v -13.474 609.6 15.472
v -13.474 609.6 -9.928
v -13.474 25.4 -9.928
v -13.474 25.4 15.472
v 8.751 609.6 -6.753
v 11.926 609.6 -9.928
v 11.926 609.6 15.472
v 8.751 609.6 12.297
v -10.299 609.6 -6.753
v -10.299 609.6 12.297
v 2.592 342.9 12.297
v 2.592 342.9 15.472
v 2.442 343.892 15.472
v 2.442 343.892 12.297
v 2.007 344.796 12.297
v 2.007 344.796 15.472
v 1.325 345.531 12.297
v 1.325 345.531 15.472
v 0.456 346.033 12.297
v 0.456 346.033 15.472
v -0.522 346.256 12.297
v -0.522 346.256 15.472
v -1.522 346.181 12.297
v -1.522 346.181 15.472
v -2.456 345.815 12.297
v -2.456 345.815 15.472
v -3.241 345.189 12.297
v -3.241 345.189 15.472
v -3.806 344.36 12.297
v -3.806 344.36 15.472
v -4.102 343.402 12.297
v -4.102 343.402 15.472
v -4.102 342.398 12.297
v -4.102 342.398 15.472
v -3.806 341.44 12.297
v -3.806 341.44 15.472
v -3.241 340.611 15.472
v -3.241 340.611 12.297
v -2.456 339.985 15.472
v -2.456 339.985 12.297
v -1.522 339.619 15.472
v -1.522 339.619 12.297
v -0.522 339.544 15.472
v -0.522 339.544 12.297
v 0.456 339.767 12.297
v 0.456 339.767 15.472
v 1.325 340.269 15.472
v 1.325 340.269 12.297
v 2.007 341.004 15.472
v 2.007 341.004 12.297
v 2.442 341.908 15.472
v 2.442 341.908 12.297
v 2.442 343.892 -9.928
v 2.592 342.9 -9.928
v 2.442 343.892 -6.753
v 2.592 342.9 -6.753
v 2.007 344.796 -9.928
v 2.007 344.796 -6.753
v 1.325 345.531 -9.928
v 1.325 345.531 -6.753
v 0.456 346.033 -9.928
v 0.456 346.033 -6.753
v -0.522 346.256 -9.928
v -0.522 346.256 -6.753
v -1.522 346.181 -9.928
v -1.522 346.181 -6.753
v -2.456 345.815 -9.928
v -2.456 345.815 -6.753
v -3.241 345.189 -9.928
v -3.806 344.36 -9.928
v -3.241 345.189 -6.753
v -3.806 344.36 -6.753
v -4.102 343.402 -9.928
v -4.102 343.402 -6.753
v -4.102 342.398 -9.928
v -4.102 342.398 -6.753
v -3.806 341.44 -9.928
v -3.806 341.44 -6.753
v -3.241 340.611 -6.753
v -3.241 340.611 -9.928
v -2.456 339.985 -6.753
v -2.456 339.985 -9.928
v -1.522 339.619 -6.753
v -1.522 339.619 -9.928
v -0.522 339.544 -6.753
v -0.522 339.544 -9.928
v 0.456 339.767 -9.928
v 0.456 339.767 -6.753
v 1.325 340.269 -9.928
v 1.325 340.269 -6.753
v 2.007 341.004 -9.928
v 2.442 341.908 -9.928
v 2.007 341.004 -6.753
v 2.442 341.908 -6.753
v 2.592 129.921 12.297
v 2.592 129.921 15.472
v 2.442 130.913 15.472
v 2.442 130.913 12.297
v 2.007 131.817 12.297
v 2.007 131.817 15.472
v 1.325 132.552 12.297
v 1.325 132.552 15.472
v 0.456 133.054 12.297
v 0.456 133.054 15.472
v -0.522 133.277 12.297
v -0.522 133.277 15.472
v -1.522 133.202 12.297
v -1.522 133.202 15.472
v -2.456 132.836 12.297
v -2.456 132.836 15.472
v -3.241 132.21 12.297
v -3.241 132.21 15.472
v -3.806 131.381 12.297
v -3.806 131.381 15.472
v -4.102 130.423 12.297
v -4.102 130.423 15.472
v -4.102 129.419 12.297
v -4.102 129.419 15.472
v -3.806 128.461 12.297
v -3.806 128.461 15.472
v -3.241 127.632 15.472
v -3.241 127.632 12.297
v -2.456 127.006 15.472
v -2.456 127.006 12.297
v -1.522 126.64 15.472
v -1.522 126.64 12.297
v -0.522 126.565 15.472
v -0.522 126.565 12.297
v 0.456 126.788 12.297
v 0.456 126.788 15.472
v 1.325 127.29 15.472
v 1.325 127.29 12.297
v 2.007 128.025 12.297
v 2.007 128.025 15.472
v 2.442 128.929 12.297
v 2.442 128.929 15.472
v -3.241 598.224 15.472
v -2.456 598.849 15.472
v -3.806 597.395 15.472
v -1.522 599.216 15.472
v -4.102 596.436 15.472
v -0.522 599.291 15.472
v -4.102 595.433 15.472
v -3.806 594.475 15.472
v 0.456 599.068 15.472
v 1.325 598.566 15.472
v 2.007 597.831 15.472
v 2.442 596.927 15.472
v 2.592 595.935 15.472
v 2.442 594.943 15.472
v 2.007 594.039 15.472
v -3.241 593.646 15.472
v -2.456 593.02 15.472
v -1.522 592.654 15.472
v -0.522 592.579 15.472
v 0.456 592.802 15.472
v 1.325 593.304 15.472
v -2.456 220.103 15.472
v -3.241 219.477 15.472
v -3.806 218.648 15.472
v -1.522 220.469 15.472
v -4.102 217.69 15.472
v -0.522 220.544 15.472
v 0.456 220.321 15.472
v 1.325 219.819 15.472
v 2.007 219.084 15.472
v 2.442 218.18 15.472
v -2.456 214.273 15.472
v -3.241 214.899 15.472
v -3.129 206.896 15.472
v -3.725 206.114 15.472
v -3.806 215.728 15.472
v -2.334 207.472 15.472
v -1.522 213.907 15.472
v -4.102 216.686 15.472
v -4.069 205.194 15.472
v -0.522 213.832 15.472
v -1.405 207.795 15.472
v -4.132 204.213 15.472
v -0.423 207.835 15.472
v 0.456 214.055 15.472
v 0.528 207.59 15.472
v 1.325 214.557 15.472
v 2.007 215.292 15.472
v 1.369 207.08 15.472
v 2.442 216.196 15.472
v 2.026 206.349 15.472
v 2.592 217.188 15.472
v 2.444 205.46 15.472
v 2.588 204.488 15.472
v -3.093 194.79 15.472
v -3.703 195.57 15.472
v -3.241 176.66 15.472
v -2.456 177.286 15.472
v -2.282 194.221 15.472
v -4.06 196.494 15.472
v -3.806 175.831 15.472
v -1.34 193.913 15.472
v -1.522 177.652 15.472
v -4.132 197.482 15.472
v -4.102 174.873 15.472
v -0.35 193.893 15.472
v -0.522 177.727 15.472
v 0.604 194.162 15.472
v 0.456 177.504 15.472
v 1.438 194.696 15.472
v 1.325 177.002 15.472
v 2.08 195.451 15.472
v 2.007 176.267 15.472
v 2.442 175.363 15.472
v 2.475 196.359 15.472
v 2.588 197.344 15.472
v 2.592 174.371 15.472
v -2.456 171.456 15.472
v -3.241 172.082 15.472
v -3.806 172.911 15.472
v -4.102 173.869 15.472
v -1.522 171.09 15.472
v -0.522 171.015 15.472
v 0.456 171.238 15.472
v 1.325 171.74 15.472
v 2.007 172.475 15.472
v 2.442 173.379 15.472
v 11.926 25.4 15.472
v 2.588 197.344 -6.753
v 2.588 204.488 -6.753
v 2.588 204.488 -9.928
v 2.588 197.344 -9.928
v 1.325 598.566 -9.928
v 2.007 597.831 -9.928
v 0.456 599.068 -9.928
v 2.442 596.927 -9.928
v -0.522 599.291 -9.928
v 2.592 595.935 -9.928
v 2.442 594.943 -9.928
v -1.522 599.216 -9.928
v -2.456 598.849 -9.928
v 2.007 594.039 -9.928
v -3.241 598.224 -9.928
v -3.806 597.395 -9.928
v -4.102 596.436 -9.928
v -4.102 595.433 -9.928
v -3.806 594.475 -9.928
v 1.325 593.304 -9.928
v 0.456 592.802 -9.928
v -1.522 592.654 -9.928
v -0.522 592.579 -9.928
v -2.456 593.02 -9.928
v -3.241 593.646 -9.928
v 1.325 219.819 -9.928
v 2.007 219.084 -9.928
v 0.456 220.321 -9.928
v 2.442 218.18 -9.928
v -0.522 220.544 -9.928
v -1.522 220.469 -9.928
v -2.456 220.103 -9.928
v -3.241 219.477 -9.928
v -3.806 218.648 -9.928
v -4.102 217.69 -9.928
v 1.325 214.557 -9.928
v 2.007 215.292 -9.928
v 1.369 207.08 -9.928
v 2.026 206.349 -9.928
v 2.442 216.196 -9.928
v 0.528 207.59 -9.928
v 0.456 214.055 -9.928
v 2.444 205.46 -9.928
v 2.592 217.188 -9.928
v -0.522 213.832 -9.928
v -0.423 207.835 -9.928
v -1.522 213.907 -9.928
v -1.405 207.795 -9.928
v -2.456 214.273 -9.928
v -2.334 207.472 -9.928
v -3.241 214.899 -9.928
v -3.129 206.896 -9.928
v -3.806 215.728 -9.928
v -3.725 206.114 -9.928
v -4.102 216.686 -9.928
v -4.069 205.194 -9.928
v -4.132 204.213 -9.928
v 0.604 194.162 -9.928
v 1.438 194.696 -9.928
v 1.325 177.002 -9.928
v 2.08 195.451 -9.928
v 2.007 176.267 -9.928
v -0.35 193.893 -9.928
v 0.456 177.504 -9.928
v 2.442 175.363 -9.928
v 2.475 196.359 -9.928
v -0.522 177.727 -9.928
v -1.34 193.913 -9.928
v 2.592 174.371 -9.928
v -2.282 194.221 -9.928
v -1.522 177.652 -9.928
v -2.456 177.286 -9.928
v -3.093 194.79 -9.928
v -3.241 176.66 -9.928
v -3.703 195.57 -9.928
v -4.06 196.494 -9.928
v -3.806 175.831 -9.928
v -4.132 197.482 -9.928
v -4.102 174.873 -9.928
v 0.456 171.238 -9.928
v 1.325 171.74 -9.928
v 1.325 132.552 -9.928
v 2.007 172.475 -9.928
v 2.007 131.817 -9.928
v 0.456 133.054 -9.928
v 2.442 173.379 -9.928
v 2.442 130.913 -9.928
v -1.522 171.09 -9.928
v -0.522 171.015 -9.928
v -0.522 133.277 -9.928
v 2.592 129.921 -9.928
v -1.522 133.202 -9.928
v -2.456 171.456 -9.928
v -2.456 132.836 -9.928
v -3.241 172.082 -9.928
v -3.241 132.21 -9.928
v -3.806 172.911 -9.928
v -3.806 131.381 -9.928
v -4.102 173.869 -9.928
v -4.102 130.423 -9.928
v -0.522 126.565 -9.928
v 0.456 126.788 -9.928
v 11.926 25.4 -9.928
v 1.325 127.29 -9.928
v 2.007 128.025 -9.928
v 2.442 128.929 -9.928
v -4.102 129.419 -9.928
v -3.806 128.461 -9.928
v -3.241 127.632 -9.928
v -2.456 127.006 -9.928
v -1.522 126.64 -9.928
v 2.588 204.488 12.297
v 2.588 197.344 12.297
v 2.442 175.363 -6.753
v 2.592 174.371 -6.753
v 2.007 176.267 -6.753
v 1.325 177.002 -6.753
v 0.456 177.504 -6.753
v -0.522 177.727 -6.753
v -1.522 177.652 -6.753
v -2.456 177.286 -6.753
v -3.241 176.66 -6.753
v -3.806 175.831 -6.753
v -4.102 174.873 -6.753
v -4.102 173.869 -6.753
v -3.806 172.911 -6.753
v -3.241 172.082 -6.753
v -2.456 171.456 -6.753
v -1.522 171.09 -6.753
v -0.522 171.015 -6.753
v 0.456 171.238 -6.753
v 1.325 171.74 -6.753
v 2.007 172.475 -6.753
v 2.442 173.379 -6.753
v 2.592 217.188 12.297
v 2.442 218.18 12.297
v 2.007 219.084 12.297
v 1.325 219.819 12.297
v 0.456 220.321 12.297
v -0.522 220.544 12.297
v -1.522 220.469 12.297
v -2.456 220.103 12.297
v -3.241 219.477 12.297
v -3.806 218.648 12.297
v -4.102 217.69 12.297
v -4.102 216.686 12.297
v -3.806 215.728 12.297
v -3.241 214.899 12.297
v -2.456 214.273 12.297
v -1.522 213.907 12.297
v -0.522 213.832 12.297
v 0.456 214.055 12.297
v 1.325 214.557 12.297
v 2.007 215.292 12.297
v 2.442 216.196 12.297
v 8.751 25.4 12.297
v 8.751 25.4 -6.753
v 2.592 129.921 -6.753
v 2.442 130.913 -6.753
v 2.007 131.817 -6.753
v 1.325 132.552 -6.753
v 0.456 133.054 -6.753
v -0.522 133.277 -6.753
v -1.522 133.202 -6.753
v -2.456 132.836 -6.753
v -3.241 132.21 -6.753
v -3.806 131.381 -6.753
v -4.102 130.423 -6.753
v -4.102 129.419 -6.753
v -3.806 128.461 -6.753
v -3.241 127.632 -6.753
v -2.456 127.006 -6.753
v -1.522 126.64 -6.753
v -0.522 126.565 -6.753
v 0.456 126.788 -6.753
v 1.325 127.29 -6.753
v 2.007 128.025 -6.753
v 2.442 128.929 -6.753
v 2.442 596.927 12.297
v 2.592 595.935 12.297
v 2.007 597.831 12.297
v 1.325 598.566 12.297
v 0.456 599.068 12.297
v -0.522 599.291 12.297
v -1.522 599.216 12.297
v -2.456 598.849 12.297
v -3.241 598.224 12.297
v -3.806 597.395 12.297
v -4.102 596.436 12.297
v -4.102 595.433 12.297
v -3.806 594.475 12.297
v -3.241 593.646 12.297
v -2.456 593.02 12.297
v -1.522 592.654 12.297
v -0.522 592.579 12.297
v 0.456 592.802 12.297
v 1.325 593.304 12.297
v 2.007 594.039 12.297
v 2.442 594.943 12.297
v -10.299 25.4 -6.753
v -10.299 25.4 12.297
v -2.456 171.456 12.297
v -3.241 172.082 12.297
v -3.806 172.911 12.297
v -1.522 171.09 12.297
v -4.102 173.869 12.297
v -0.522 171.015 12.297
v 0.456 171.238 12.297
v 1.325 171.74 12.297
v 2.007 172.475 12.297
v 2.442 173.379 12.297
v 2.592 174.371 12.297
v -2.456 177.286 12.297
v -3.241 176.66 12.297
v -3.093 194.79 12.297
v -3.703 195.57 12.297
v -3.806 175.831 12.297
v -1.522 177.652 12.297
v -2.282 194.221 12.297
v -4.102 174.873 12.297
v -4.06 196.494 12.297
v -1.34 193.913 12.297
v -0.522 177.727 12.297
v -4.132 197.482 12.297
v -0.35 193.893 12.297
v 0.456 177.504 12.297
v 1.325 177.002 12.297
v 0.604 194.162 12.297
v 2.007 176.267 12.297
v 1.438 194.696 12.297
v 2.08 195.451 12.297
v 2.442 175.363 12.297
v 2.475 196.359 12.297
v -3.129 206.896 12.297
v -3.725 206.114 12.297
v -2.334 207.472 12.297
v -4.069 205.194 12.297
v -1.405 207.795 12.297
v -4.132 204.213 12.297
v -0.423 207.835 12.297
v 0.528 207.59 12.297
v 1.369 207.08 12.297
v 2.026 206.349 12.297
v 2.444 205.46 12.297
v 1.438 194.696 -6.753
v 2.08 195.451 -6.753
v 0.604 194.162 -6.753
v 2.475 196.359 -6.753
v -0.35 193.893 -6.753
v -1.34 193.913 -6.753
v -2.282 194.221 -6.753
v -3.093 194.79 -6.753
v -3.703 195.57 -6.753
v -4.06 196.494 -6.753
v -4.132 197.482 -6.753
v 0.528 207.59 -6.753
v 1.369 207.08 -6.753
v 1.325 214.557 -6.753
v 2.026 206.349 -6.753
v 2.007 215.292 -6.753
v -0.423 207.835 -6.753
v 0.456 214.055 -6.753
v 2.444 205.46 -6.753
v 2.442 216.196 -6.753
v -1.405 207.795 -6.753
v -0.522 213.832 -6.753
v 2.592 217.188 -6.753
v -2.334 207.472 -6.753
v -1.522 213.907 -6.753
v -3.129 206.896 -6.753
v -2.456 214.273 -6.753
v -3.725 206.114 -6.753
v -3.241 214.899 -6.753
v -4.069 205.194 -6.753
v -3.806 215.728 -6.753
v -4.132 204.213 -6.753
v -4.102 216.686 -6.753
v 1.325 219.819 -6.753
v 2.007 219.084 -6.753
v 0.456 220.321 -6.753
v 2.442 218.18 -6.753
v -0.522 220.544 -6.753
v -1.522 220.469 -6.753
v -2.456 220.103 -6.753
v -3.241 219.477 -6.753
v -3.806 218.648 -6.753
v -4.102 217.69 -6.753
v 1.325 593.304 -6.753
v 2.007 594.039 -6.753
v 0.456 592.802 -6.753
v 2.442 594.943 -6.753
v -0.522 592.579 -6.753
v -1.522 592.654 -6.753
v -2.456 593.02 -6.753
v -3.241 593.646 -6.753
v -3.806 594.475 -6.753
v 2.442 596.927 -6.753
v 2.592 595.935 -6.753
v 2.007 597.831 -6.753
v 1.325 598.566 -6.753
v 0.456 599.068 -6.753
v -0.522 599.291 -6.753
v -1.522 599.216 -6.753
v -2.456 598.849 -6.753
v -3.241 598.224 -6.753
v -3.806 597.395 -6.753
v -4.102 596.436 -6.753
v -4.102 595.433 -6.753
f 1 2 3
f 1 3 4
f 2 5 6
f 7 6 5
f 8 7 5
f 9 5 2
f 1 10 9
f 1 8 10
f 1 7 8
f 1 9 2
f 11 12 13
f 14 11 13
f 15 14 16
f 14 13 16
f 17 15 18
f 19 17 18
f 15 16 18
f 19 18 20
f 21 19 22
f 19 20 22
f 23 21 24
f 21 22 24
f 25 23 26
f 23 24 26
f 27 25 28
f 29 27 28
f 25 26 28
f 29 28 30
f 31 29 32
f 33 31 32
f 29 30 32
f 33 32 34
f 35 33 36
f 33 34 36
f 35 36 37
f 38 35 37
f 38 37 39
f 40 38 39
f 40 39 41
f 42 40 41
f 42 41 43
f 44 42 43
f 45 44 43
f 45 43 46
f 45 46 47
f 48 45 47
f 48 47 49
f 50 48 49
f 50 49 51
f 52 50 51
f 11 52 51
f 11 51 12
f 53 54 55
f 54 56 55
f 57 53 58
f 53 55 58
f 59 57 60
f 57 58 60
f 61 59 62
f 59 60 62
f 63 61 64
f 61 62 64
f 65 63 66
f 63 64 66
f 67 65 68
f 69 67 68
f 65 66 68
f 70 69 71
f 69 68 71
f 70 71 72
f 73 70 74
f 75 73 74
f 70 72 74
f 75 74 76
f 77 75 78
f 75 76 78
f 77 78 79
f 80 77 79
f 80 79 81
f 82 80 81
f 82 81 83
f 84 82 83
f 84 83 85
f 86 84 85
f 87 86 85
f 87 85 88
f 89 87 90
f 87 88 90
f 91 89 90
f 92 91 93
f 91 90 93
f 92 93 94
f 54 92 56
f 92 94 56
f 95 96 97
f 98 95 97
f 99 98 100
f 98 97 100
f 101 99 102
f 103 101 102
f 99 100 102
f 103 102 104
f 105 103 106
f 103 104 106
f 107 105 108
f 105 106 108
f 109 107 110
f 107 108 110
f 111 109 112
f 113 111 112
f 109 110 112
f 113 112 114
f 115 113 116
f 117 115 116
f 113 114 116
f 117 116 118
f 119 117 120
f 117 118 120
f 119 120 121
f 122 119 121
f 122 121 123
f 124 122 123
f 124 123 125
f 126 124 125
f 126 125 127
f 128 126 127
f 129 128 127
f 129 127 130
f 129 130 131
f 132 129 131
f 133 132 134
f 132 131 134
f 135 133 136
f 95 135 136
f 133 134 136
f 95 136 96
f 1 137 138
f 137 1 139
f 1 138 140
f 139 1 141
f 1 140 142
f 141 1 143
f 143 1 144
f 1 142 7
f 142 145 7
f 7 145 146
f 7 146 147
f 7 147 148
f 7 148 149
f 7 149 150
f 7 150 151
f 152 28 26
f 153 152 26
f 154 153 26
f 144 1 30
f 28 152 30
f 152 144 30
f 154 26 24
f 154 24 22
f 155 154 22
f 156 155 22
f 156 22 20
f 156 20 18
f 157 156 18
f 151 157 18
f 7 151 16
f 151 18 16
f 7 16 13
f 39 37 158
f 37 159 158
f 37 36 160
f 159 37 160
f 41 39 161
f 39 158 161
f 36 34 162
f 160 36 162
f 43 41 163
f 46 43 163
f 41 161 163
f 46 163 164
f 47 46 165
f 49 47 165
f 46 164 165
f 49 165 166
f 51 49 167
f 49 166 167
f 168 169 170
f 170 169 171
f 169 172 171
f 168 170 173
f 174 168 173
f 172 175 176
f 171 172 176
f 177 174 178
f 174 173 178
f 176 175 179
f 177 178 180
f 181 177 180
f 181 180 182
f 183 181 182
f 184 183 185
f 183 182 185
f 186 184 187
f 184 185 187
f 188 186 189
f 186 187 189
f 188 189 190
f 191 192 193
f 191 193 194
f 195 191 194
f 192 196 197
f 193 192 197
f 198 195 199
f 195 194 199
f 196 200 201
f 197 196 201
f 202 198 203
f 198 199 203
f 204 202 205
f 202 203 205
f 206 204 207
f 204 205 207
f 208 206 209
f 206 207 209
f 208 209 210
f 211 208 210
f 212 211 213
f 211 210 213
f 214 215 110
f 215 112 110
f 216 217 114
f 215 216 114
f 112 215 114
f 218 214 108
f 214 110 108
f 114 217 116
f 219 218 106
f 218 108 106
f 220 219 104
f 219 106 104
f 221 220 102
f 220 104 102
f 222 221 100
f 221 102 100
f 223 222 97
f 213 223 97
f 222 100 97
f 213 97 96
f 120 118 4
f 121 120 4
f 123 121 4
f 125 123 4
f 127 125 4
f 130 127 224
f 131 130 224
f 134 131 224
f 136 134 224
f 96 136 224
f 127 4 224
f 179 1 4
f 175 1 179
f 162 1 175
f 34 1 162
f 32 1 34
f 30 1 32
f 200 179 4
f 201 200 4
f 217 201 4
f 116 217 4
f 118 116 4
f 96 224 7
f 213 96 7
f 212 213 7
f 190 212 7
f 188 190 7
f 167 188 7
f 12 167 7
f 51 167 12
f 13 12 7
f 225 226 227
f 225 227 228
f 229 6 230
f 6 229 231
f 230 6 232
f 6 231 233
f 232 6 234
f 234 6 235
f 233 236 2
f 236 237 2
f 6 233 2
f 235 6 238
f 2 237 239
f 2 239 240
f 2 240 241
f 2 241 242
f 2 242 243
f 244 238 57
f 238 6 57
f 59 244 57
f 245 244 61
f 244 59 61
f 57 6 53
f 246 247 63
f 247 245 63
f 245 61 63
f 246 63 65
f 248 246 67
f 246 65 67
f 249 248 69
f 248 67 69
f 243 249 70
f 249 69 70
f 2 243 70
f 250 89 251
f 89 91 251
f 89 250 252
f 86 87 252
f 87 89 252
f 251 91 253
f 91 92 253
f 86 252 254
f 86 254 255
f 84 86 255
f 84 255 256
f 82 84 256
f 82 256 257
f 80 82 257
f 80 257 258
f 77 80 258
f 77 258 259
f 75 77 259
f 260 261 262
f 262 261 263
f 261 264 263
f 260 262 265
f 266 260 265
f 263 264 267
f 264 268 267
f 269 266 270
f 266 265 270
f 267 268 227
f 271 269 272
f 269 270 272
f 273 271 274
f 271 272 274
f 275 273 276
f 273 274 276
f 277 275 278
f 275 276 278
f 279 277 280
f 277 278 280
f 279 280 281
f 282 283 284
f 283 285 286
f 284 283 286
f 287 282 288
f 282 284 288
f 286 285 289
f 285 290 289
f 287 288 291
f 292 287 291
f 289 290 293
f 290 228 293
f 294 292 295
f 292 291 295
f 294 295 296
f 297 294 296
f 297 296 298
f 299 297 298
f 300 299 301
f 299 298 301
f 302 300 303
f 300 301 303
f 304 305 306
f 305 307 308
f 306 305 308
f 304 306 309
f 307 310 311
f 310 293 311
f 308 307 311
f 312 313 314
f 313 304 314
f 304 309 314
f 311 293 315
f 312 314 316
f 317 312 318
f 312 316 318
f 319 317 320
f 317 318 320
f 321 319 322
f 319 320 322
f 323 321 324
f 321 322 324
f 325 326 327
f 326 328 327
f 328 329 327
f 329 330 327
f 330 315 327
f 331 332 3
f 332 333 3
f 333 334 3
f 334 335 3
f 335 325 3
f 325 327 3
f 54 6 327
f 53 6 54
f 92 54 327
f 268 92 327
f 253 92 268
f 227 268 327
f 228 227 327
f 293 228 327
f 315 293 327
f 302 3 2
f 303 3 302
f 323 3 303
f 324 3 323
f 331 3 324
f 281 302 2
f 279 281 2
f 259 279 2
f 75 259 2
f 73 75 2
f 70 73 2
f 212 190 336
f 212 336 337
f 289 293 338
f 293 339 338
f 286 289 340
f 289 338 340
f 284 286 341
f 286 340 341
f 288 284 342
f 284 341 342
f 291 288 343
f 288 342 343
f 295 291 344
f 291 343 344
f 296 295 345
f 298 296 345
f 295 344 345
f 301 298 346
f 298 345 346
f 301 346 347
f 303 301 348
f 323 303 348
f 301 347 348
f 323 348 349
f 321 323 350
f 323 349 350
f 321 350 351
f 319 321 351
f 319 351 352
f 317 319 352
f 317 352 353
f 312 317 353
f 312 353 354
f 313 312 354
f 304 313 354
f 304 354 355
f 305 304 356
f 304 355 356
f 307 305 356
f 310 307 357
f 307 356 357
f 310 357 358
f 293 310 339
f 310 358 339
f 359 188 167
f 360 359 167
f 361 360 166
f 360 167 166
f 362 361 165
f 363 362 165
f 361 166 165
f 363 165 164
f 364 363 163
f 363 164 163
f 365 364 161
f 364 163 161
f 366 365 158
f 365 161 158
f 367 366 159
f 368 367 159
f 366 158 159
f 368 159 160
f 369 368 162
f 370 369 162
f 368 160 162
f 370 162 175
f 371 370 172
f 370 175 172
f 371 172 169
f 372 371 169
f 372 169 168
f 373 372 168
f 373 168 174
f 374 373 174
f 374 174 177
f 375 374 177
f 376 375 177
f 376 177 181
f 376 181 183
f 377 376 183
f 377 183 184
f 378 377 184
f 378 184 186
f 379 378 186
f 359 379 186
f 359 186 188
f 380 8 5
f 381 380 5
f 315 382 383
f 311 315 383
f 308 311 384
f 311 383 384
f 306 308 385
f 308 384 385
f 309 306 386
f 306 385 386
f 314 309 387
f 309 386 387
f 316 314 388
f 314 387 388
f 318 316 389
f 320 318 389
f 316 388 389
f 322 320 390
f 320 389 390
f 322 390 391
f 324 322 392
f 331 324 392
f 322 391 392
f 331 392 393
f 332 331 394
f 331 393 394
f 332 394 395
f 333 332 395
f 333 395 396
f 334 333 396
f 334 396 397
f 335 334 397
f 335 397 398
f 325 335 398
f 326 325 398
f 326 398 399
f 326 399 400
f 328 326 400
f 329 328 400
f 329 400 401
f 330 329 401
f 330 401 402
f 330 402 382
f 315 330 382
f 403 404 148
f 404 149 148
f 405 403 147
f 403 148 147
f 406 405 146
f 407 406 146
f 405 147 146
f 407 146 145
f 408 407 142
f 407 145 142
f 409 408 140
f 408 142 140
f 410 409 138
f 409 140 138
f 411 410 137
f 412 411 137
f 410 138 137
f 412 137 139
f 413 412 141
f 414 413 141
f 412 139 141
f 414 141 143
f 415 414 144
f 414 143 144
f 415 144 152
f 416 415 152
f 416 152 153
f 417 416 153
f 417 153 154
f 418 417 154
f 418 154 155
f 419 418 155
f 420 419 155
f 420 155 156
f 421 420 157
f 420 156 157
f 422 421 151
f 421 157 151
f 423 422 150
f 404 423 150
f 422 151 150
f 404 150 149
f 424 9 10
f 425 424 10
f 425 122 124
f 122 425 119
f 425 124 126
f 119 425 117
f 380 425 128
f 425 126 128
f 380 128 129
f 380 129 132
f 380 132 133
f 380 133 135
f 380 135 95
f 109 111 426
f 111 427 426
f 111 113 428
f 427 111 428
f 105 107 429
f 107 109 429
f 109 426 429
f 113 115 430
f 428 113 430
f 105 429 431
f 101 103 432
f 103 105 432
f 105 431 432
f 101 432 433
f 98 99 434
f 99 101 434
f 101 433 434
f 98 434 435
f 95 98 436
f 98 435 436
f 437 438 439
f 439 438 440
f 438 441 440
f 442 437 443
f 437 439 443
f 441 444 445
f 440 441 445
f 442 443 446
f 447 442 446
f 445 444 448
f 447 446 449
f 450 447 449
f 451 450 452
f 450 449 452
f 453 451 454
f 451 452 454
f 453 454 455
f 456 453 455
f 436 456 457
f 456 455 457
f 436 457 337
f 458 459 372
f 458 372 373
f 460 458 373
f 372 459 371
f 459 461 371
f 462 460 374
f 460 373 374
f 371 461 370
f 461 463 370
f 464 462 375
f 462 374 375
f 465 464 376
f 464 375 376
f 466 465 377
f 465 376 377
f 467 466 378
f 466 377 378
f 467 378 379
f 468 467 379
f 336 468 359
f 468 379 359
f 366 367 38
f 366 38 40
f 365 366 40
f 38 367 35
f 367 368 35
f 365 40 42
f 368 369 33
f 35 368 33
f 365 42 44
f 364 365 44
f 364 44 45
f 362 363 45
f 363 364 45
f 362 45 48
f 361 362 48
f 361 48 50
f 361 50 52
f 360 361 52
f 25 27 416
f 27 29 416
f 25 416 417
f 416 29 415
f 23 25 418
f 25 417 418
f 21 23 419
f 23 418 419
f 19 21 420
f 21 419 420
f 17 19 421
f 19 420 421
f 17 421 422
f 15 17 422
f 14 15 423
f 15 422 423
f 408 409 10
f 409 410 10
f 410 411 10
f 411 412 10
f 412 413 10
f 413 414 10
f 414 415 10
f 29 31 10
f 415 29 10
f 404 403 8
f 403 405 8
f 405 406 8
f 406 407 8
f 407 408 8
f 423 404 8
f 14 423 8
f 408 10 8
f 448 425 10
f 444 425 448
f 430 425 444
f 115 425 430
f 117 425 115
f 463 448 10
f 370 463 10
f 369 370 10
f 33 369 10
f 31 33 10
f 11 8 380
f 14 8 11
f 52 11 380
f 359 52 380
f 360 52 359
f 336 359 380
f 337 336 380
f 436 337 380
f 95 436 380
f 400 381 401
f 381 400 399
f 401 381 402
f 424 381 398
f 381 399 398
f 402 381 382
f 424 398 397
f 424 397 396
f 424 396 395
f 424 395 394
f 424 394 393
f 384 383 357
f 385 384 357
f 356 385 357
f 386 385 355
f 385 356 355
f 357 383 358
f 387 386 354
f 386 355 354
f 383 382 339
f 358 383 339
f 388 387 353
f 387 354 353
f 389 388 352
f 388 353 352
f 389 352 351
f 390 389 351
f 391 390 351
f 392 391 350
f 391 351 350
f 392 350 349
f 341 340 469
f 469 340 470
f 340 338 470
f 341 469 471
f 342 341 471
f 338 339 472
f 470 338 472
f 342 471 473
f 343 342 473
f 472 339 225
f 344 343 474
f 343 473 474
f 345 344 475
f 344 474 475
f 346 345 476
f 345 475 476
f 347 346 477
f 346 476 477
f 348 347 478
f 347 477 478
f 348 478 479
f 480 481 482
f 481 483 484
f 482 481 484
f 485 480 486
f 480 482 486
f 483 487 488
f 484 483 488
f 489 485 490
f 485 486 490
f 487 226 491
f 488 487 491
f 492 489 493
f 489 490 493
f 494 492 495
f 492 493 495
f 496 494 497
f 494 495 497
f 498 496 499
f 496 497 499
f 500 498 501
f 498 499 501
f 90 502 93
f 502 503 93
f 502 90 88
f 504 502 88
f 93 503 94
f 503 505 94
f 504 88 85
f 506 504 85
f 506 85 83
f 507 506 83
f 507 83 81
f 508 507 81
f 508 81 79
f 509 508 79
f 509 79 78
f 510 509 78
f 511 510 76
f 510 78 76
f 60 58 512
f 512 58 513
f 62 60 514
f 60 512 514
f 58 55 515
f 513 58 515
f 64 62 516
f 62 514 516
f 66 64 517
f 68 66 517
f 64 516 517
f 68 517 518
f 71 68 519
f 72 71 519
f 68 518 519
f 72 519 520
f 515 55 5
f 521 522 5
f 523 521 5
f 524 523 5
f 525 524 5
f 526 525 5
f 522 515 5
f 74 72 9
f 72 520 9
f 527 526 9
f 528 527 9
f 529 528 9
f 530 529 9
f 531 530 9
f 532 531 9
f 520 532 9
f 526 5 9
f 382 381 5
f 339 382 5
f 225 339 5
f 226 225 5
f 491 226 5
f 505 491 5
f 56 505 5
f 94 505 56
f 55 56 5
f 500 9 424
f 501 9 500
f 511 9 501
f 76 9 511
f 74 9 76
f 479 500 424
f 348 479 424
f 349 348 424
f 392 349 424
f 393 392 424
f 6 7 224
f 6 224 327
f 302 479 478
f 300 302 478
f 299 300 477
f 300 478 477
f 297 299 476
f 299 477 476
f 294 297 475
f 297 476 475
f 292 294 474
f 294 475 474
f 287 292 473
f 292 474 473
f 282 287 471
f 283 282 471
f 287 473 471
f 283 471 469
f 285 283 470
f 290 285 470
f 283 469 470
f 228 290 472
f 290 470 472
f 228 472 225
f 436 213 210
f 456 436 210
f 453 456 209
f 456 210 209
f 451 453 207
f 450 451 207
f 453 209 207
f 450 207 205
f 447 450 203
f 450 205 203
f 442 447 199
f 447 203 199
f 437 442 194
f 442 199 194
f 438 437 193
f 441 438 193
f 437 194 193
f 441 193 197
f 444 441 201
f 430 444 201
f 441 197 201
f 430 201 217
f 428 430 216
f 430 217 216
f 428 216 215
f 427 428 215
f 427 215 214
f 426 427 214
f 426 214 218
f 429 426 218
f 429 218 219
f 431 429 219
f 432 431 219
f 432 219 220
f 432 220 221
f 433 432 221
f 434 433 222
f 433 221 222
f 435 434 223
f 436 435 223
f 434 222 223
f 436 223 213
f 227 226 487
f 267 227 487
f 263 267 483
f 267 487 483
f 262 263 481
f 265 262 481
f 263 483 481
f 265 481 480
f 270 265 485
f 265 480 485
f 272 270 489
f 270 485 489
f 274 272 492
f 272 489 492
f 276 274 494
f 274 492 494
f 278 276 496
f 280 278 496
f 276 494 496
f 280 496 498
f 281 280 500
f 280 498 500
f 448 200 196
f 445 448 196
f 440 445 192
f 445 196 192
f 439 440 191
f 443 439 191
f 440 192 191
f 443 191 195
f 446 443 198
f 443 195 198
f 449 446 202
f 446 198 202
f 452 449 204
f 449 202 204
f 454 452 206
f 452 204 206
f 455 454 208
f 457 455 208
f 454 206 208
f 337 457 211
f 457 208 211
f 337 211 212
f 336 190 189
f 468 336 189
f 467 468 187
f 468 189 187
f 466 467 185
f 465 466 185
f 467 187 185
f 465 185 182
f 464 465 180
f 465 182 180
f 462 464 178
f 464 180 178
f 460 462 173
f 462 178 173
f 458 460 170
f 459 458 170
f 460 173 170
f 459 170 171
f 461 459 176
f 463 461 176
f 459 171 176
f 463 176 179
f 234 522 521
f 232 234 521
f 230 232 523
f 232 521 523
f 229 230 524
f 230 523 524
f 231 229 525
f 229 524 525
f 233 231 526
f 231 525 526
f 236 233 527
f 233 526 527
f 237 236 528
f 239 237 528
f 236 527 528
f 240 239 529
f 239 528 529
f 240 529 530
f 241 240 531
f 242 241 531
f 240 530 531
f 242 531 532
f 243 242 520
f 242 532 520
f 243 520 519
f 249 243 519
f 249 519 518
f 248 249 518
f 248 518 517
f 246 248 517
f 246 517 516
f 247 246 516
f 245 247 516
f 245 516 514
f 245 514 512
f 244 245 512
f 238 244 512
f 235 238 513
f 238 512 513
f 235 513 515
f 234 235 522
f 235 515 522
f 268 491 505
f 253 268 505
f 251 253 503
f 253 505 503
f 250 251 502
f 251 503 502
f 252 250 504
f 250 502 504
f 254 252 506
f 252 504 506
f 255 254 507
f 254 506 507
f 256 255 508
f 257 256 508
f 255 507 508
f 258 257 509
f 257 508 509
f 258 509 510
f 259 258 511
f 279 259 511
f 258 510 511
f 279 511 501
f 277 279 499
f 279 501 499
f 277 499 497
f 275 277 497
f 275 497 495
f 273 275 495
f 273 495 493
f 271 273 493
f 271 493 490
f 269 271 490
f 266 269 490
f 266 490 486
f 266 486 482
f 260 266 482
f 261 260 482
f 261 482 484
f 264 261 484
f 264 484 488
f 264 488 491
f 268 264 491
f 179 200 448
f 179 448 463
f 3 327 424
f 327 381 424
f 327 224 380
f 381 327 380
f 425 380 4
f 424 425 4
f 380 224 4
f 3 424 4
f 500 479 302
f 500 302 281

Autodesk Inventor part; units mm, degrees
ref_plane "YZ Plane" through (0, 0, 0) normal (1, 0, 0) x (0, 1, 0)
ref_plane "XZ Plane" through (0, 0, 0) normal (0, 1, 0) x (-1, 0, 0)
ref_plane "XY Plane" through (0, 0, 0) normal (0, 0, 1) x (1, 0, 0)
sketch "Sketch1" plane through (0, 0, 0) normal (0, 1, 0) x (-1, 0, 0)
  line L0 (13.4736, 15.4721) -> (-11.9264, 15.4721)
  line L1 (-11.9264, 15.4721) -> (-11.9264, -9.9279)
  line L2 (-11.9264, -9.9279) -> (13.4736, -9.9279)
  line L3 (13.4736, -9.9279) -> (13.4736, 15.4721)
  point P0 (0, 0)
  dimension "d0" = 25.4
  dimension "d1" = 25.4
extrude "Extrusion1" add sketch "Sketch1" along normal blind 609.6
shell "Shell1" thickness 3.175 removed faces 1 at (3.4597, 609.6, 7.0054)
sketch "Sketch2" plane through (0, 609.6, 0) normal (0, 1, 0) x (1, 0, 0)
  line L0 (-10.2986, -12.2971) -> (8.7514, -12.2971)
  line L1 (8.7514, -12.2971) -> (8.7514, 6.7529)
  line L2 (8.7514, 6.7529) -> (-10.2986, 6.7529)
  line L3 (-10.2986, 6.7529) -> (-10.2986, -12.2971)
  point P0 (0, 0)
extrude "Extrusion2" cut sketch "Sketch2" against normal blind 609.6
sketch "Sketch3" plane through (-13.4736, 0, 15.4721) normal (0, 0, 1) x (1, 0, 0)
  line L0 (38.1, 608.6348) -> (0, 608.6348)
  circle A0 centre (12.7, 12.7) radius 3.3655
  circle A1 centre (12.7, 342.9) radius 3.3655
  circle A2 centre (12.7, 595.9348) radius 3.3655
  line L1 (0, 557.8348) -> (0, 608.6348)
  line L2 (0, 50.8) -> (0, 0)
  line L3 (12.7, 342.9) -> (0, 304.3174) construction
  line L4 (0, 317.5) -> (0, 368.3)
  line L5 (0, 129.921) -> (12.7, 129.921) construction
  circle A3 centre (12.7, 129.921) radius 3.3655
  circle A4 centre (12.7, 174.371) radius 3.3655
  line L6 (9.3413, 197.482) -> (9.3413, 204.213)
  line L7 (16.0611, 204.488) -> (16.0611, 197.3435)
  arc A5 (16.0611, 204.488) -> (9.3413, 204.213) centre (12.6956, 204.488) ccw
  arc A6 (9.3413, 197.482) -> (16.0611, 197.3435) centre (12.6974, 197.231) ccw
  circle A7 centre (12.7, 217.188) radius 3.3655
  line L8 (0, 0) -> (0, 609.6) projected
  point P0 (13.4736, 0)
  dimension "d7" = 38.1
  dimension "d20" = 12.7
  dimension "d29" = 12.7
  dimension "d30" = 6.731
  dimension "d31" = 3.3655
  dimension "d32" = 3.3655
  dimension "d33" = 6.731
  dimension "d34" = 12.7
  dimension "d36" = 90
  dimension "d37" = 90
  dimension "d40" = 478.7138
  dimension "d44" = 404.1468
  dimension "d45" = 411.2913
  dimension "d48" = 434.2638
  dimension "d49" = 50.8
  dimension "d50" = 240.3348
  dimension "d51" = 291.1348
  dimension "d52" = 557.8348
extrude "Extrusion3" cut sketch "Sketch3" against normal blind 76.2
sketch "Sketch4" plane through (-13.4736, 0, 15.4721) normal (0, 0, 1) x (1, 0, 0)
  line L0 (0, 0) -> (25.4, 0)
  line L1 (25.4, 0) -> (25.4, 25.4)
  line L2 (25.4, 25.4) -> (0, 25.4)
  line L3 (0, 25.4) -> (0, 0)
  point P0 (13.4736, 0)
  dimension "d55" = 25.4
  dimension "d56" = 25.4
extrude "Extrusion4" cut sketch "Sketch4" against normal blind 25.4
properties part number "ClawArmBeam"
